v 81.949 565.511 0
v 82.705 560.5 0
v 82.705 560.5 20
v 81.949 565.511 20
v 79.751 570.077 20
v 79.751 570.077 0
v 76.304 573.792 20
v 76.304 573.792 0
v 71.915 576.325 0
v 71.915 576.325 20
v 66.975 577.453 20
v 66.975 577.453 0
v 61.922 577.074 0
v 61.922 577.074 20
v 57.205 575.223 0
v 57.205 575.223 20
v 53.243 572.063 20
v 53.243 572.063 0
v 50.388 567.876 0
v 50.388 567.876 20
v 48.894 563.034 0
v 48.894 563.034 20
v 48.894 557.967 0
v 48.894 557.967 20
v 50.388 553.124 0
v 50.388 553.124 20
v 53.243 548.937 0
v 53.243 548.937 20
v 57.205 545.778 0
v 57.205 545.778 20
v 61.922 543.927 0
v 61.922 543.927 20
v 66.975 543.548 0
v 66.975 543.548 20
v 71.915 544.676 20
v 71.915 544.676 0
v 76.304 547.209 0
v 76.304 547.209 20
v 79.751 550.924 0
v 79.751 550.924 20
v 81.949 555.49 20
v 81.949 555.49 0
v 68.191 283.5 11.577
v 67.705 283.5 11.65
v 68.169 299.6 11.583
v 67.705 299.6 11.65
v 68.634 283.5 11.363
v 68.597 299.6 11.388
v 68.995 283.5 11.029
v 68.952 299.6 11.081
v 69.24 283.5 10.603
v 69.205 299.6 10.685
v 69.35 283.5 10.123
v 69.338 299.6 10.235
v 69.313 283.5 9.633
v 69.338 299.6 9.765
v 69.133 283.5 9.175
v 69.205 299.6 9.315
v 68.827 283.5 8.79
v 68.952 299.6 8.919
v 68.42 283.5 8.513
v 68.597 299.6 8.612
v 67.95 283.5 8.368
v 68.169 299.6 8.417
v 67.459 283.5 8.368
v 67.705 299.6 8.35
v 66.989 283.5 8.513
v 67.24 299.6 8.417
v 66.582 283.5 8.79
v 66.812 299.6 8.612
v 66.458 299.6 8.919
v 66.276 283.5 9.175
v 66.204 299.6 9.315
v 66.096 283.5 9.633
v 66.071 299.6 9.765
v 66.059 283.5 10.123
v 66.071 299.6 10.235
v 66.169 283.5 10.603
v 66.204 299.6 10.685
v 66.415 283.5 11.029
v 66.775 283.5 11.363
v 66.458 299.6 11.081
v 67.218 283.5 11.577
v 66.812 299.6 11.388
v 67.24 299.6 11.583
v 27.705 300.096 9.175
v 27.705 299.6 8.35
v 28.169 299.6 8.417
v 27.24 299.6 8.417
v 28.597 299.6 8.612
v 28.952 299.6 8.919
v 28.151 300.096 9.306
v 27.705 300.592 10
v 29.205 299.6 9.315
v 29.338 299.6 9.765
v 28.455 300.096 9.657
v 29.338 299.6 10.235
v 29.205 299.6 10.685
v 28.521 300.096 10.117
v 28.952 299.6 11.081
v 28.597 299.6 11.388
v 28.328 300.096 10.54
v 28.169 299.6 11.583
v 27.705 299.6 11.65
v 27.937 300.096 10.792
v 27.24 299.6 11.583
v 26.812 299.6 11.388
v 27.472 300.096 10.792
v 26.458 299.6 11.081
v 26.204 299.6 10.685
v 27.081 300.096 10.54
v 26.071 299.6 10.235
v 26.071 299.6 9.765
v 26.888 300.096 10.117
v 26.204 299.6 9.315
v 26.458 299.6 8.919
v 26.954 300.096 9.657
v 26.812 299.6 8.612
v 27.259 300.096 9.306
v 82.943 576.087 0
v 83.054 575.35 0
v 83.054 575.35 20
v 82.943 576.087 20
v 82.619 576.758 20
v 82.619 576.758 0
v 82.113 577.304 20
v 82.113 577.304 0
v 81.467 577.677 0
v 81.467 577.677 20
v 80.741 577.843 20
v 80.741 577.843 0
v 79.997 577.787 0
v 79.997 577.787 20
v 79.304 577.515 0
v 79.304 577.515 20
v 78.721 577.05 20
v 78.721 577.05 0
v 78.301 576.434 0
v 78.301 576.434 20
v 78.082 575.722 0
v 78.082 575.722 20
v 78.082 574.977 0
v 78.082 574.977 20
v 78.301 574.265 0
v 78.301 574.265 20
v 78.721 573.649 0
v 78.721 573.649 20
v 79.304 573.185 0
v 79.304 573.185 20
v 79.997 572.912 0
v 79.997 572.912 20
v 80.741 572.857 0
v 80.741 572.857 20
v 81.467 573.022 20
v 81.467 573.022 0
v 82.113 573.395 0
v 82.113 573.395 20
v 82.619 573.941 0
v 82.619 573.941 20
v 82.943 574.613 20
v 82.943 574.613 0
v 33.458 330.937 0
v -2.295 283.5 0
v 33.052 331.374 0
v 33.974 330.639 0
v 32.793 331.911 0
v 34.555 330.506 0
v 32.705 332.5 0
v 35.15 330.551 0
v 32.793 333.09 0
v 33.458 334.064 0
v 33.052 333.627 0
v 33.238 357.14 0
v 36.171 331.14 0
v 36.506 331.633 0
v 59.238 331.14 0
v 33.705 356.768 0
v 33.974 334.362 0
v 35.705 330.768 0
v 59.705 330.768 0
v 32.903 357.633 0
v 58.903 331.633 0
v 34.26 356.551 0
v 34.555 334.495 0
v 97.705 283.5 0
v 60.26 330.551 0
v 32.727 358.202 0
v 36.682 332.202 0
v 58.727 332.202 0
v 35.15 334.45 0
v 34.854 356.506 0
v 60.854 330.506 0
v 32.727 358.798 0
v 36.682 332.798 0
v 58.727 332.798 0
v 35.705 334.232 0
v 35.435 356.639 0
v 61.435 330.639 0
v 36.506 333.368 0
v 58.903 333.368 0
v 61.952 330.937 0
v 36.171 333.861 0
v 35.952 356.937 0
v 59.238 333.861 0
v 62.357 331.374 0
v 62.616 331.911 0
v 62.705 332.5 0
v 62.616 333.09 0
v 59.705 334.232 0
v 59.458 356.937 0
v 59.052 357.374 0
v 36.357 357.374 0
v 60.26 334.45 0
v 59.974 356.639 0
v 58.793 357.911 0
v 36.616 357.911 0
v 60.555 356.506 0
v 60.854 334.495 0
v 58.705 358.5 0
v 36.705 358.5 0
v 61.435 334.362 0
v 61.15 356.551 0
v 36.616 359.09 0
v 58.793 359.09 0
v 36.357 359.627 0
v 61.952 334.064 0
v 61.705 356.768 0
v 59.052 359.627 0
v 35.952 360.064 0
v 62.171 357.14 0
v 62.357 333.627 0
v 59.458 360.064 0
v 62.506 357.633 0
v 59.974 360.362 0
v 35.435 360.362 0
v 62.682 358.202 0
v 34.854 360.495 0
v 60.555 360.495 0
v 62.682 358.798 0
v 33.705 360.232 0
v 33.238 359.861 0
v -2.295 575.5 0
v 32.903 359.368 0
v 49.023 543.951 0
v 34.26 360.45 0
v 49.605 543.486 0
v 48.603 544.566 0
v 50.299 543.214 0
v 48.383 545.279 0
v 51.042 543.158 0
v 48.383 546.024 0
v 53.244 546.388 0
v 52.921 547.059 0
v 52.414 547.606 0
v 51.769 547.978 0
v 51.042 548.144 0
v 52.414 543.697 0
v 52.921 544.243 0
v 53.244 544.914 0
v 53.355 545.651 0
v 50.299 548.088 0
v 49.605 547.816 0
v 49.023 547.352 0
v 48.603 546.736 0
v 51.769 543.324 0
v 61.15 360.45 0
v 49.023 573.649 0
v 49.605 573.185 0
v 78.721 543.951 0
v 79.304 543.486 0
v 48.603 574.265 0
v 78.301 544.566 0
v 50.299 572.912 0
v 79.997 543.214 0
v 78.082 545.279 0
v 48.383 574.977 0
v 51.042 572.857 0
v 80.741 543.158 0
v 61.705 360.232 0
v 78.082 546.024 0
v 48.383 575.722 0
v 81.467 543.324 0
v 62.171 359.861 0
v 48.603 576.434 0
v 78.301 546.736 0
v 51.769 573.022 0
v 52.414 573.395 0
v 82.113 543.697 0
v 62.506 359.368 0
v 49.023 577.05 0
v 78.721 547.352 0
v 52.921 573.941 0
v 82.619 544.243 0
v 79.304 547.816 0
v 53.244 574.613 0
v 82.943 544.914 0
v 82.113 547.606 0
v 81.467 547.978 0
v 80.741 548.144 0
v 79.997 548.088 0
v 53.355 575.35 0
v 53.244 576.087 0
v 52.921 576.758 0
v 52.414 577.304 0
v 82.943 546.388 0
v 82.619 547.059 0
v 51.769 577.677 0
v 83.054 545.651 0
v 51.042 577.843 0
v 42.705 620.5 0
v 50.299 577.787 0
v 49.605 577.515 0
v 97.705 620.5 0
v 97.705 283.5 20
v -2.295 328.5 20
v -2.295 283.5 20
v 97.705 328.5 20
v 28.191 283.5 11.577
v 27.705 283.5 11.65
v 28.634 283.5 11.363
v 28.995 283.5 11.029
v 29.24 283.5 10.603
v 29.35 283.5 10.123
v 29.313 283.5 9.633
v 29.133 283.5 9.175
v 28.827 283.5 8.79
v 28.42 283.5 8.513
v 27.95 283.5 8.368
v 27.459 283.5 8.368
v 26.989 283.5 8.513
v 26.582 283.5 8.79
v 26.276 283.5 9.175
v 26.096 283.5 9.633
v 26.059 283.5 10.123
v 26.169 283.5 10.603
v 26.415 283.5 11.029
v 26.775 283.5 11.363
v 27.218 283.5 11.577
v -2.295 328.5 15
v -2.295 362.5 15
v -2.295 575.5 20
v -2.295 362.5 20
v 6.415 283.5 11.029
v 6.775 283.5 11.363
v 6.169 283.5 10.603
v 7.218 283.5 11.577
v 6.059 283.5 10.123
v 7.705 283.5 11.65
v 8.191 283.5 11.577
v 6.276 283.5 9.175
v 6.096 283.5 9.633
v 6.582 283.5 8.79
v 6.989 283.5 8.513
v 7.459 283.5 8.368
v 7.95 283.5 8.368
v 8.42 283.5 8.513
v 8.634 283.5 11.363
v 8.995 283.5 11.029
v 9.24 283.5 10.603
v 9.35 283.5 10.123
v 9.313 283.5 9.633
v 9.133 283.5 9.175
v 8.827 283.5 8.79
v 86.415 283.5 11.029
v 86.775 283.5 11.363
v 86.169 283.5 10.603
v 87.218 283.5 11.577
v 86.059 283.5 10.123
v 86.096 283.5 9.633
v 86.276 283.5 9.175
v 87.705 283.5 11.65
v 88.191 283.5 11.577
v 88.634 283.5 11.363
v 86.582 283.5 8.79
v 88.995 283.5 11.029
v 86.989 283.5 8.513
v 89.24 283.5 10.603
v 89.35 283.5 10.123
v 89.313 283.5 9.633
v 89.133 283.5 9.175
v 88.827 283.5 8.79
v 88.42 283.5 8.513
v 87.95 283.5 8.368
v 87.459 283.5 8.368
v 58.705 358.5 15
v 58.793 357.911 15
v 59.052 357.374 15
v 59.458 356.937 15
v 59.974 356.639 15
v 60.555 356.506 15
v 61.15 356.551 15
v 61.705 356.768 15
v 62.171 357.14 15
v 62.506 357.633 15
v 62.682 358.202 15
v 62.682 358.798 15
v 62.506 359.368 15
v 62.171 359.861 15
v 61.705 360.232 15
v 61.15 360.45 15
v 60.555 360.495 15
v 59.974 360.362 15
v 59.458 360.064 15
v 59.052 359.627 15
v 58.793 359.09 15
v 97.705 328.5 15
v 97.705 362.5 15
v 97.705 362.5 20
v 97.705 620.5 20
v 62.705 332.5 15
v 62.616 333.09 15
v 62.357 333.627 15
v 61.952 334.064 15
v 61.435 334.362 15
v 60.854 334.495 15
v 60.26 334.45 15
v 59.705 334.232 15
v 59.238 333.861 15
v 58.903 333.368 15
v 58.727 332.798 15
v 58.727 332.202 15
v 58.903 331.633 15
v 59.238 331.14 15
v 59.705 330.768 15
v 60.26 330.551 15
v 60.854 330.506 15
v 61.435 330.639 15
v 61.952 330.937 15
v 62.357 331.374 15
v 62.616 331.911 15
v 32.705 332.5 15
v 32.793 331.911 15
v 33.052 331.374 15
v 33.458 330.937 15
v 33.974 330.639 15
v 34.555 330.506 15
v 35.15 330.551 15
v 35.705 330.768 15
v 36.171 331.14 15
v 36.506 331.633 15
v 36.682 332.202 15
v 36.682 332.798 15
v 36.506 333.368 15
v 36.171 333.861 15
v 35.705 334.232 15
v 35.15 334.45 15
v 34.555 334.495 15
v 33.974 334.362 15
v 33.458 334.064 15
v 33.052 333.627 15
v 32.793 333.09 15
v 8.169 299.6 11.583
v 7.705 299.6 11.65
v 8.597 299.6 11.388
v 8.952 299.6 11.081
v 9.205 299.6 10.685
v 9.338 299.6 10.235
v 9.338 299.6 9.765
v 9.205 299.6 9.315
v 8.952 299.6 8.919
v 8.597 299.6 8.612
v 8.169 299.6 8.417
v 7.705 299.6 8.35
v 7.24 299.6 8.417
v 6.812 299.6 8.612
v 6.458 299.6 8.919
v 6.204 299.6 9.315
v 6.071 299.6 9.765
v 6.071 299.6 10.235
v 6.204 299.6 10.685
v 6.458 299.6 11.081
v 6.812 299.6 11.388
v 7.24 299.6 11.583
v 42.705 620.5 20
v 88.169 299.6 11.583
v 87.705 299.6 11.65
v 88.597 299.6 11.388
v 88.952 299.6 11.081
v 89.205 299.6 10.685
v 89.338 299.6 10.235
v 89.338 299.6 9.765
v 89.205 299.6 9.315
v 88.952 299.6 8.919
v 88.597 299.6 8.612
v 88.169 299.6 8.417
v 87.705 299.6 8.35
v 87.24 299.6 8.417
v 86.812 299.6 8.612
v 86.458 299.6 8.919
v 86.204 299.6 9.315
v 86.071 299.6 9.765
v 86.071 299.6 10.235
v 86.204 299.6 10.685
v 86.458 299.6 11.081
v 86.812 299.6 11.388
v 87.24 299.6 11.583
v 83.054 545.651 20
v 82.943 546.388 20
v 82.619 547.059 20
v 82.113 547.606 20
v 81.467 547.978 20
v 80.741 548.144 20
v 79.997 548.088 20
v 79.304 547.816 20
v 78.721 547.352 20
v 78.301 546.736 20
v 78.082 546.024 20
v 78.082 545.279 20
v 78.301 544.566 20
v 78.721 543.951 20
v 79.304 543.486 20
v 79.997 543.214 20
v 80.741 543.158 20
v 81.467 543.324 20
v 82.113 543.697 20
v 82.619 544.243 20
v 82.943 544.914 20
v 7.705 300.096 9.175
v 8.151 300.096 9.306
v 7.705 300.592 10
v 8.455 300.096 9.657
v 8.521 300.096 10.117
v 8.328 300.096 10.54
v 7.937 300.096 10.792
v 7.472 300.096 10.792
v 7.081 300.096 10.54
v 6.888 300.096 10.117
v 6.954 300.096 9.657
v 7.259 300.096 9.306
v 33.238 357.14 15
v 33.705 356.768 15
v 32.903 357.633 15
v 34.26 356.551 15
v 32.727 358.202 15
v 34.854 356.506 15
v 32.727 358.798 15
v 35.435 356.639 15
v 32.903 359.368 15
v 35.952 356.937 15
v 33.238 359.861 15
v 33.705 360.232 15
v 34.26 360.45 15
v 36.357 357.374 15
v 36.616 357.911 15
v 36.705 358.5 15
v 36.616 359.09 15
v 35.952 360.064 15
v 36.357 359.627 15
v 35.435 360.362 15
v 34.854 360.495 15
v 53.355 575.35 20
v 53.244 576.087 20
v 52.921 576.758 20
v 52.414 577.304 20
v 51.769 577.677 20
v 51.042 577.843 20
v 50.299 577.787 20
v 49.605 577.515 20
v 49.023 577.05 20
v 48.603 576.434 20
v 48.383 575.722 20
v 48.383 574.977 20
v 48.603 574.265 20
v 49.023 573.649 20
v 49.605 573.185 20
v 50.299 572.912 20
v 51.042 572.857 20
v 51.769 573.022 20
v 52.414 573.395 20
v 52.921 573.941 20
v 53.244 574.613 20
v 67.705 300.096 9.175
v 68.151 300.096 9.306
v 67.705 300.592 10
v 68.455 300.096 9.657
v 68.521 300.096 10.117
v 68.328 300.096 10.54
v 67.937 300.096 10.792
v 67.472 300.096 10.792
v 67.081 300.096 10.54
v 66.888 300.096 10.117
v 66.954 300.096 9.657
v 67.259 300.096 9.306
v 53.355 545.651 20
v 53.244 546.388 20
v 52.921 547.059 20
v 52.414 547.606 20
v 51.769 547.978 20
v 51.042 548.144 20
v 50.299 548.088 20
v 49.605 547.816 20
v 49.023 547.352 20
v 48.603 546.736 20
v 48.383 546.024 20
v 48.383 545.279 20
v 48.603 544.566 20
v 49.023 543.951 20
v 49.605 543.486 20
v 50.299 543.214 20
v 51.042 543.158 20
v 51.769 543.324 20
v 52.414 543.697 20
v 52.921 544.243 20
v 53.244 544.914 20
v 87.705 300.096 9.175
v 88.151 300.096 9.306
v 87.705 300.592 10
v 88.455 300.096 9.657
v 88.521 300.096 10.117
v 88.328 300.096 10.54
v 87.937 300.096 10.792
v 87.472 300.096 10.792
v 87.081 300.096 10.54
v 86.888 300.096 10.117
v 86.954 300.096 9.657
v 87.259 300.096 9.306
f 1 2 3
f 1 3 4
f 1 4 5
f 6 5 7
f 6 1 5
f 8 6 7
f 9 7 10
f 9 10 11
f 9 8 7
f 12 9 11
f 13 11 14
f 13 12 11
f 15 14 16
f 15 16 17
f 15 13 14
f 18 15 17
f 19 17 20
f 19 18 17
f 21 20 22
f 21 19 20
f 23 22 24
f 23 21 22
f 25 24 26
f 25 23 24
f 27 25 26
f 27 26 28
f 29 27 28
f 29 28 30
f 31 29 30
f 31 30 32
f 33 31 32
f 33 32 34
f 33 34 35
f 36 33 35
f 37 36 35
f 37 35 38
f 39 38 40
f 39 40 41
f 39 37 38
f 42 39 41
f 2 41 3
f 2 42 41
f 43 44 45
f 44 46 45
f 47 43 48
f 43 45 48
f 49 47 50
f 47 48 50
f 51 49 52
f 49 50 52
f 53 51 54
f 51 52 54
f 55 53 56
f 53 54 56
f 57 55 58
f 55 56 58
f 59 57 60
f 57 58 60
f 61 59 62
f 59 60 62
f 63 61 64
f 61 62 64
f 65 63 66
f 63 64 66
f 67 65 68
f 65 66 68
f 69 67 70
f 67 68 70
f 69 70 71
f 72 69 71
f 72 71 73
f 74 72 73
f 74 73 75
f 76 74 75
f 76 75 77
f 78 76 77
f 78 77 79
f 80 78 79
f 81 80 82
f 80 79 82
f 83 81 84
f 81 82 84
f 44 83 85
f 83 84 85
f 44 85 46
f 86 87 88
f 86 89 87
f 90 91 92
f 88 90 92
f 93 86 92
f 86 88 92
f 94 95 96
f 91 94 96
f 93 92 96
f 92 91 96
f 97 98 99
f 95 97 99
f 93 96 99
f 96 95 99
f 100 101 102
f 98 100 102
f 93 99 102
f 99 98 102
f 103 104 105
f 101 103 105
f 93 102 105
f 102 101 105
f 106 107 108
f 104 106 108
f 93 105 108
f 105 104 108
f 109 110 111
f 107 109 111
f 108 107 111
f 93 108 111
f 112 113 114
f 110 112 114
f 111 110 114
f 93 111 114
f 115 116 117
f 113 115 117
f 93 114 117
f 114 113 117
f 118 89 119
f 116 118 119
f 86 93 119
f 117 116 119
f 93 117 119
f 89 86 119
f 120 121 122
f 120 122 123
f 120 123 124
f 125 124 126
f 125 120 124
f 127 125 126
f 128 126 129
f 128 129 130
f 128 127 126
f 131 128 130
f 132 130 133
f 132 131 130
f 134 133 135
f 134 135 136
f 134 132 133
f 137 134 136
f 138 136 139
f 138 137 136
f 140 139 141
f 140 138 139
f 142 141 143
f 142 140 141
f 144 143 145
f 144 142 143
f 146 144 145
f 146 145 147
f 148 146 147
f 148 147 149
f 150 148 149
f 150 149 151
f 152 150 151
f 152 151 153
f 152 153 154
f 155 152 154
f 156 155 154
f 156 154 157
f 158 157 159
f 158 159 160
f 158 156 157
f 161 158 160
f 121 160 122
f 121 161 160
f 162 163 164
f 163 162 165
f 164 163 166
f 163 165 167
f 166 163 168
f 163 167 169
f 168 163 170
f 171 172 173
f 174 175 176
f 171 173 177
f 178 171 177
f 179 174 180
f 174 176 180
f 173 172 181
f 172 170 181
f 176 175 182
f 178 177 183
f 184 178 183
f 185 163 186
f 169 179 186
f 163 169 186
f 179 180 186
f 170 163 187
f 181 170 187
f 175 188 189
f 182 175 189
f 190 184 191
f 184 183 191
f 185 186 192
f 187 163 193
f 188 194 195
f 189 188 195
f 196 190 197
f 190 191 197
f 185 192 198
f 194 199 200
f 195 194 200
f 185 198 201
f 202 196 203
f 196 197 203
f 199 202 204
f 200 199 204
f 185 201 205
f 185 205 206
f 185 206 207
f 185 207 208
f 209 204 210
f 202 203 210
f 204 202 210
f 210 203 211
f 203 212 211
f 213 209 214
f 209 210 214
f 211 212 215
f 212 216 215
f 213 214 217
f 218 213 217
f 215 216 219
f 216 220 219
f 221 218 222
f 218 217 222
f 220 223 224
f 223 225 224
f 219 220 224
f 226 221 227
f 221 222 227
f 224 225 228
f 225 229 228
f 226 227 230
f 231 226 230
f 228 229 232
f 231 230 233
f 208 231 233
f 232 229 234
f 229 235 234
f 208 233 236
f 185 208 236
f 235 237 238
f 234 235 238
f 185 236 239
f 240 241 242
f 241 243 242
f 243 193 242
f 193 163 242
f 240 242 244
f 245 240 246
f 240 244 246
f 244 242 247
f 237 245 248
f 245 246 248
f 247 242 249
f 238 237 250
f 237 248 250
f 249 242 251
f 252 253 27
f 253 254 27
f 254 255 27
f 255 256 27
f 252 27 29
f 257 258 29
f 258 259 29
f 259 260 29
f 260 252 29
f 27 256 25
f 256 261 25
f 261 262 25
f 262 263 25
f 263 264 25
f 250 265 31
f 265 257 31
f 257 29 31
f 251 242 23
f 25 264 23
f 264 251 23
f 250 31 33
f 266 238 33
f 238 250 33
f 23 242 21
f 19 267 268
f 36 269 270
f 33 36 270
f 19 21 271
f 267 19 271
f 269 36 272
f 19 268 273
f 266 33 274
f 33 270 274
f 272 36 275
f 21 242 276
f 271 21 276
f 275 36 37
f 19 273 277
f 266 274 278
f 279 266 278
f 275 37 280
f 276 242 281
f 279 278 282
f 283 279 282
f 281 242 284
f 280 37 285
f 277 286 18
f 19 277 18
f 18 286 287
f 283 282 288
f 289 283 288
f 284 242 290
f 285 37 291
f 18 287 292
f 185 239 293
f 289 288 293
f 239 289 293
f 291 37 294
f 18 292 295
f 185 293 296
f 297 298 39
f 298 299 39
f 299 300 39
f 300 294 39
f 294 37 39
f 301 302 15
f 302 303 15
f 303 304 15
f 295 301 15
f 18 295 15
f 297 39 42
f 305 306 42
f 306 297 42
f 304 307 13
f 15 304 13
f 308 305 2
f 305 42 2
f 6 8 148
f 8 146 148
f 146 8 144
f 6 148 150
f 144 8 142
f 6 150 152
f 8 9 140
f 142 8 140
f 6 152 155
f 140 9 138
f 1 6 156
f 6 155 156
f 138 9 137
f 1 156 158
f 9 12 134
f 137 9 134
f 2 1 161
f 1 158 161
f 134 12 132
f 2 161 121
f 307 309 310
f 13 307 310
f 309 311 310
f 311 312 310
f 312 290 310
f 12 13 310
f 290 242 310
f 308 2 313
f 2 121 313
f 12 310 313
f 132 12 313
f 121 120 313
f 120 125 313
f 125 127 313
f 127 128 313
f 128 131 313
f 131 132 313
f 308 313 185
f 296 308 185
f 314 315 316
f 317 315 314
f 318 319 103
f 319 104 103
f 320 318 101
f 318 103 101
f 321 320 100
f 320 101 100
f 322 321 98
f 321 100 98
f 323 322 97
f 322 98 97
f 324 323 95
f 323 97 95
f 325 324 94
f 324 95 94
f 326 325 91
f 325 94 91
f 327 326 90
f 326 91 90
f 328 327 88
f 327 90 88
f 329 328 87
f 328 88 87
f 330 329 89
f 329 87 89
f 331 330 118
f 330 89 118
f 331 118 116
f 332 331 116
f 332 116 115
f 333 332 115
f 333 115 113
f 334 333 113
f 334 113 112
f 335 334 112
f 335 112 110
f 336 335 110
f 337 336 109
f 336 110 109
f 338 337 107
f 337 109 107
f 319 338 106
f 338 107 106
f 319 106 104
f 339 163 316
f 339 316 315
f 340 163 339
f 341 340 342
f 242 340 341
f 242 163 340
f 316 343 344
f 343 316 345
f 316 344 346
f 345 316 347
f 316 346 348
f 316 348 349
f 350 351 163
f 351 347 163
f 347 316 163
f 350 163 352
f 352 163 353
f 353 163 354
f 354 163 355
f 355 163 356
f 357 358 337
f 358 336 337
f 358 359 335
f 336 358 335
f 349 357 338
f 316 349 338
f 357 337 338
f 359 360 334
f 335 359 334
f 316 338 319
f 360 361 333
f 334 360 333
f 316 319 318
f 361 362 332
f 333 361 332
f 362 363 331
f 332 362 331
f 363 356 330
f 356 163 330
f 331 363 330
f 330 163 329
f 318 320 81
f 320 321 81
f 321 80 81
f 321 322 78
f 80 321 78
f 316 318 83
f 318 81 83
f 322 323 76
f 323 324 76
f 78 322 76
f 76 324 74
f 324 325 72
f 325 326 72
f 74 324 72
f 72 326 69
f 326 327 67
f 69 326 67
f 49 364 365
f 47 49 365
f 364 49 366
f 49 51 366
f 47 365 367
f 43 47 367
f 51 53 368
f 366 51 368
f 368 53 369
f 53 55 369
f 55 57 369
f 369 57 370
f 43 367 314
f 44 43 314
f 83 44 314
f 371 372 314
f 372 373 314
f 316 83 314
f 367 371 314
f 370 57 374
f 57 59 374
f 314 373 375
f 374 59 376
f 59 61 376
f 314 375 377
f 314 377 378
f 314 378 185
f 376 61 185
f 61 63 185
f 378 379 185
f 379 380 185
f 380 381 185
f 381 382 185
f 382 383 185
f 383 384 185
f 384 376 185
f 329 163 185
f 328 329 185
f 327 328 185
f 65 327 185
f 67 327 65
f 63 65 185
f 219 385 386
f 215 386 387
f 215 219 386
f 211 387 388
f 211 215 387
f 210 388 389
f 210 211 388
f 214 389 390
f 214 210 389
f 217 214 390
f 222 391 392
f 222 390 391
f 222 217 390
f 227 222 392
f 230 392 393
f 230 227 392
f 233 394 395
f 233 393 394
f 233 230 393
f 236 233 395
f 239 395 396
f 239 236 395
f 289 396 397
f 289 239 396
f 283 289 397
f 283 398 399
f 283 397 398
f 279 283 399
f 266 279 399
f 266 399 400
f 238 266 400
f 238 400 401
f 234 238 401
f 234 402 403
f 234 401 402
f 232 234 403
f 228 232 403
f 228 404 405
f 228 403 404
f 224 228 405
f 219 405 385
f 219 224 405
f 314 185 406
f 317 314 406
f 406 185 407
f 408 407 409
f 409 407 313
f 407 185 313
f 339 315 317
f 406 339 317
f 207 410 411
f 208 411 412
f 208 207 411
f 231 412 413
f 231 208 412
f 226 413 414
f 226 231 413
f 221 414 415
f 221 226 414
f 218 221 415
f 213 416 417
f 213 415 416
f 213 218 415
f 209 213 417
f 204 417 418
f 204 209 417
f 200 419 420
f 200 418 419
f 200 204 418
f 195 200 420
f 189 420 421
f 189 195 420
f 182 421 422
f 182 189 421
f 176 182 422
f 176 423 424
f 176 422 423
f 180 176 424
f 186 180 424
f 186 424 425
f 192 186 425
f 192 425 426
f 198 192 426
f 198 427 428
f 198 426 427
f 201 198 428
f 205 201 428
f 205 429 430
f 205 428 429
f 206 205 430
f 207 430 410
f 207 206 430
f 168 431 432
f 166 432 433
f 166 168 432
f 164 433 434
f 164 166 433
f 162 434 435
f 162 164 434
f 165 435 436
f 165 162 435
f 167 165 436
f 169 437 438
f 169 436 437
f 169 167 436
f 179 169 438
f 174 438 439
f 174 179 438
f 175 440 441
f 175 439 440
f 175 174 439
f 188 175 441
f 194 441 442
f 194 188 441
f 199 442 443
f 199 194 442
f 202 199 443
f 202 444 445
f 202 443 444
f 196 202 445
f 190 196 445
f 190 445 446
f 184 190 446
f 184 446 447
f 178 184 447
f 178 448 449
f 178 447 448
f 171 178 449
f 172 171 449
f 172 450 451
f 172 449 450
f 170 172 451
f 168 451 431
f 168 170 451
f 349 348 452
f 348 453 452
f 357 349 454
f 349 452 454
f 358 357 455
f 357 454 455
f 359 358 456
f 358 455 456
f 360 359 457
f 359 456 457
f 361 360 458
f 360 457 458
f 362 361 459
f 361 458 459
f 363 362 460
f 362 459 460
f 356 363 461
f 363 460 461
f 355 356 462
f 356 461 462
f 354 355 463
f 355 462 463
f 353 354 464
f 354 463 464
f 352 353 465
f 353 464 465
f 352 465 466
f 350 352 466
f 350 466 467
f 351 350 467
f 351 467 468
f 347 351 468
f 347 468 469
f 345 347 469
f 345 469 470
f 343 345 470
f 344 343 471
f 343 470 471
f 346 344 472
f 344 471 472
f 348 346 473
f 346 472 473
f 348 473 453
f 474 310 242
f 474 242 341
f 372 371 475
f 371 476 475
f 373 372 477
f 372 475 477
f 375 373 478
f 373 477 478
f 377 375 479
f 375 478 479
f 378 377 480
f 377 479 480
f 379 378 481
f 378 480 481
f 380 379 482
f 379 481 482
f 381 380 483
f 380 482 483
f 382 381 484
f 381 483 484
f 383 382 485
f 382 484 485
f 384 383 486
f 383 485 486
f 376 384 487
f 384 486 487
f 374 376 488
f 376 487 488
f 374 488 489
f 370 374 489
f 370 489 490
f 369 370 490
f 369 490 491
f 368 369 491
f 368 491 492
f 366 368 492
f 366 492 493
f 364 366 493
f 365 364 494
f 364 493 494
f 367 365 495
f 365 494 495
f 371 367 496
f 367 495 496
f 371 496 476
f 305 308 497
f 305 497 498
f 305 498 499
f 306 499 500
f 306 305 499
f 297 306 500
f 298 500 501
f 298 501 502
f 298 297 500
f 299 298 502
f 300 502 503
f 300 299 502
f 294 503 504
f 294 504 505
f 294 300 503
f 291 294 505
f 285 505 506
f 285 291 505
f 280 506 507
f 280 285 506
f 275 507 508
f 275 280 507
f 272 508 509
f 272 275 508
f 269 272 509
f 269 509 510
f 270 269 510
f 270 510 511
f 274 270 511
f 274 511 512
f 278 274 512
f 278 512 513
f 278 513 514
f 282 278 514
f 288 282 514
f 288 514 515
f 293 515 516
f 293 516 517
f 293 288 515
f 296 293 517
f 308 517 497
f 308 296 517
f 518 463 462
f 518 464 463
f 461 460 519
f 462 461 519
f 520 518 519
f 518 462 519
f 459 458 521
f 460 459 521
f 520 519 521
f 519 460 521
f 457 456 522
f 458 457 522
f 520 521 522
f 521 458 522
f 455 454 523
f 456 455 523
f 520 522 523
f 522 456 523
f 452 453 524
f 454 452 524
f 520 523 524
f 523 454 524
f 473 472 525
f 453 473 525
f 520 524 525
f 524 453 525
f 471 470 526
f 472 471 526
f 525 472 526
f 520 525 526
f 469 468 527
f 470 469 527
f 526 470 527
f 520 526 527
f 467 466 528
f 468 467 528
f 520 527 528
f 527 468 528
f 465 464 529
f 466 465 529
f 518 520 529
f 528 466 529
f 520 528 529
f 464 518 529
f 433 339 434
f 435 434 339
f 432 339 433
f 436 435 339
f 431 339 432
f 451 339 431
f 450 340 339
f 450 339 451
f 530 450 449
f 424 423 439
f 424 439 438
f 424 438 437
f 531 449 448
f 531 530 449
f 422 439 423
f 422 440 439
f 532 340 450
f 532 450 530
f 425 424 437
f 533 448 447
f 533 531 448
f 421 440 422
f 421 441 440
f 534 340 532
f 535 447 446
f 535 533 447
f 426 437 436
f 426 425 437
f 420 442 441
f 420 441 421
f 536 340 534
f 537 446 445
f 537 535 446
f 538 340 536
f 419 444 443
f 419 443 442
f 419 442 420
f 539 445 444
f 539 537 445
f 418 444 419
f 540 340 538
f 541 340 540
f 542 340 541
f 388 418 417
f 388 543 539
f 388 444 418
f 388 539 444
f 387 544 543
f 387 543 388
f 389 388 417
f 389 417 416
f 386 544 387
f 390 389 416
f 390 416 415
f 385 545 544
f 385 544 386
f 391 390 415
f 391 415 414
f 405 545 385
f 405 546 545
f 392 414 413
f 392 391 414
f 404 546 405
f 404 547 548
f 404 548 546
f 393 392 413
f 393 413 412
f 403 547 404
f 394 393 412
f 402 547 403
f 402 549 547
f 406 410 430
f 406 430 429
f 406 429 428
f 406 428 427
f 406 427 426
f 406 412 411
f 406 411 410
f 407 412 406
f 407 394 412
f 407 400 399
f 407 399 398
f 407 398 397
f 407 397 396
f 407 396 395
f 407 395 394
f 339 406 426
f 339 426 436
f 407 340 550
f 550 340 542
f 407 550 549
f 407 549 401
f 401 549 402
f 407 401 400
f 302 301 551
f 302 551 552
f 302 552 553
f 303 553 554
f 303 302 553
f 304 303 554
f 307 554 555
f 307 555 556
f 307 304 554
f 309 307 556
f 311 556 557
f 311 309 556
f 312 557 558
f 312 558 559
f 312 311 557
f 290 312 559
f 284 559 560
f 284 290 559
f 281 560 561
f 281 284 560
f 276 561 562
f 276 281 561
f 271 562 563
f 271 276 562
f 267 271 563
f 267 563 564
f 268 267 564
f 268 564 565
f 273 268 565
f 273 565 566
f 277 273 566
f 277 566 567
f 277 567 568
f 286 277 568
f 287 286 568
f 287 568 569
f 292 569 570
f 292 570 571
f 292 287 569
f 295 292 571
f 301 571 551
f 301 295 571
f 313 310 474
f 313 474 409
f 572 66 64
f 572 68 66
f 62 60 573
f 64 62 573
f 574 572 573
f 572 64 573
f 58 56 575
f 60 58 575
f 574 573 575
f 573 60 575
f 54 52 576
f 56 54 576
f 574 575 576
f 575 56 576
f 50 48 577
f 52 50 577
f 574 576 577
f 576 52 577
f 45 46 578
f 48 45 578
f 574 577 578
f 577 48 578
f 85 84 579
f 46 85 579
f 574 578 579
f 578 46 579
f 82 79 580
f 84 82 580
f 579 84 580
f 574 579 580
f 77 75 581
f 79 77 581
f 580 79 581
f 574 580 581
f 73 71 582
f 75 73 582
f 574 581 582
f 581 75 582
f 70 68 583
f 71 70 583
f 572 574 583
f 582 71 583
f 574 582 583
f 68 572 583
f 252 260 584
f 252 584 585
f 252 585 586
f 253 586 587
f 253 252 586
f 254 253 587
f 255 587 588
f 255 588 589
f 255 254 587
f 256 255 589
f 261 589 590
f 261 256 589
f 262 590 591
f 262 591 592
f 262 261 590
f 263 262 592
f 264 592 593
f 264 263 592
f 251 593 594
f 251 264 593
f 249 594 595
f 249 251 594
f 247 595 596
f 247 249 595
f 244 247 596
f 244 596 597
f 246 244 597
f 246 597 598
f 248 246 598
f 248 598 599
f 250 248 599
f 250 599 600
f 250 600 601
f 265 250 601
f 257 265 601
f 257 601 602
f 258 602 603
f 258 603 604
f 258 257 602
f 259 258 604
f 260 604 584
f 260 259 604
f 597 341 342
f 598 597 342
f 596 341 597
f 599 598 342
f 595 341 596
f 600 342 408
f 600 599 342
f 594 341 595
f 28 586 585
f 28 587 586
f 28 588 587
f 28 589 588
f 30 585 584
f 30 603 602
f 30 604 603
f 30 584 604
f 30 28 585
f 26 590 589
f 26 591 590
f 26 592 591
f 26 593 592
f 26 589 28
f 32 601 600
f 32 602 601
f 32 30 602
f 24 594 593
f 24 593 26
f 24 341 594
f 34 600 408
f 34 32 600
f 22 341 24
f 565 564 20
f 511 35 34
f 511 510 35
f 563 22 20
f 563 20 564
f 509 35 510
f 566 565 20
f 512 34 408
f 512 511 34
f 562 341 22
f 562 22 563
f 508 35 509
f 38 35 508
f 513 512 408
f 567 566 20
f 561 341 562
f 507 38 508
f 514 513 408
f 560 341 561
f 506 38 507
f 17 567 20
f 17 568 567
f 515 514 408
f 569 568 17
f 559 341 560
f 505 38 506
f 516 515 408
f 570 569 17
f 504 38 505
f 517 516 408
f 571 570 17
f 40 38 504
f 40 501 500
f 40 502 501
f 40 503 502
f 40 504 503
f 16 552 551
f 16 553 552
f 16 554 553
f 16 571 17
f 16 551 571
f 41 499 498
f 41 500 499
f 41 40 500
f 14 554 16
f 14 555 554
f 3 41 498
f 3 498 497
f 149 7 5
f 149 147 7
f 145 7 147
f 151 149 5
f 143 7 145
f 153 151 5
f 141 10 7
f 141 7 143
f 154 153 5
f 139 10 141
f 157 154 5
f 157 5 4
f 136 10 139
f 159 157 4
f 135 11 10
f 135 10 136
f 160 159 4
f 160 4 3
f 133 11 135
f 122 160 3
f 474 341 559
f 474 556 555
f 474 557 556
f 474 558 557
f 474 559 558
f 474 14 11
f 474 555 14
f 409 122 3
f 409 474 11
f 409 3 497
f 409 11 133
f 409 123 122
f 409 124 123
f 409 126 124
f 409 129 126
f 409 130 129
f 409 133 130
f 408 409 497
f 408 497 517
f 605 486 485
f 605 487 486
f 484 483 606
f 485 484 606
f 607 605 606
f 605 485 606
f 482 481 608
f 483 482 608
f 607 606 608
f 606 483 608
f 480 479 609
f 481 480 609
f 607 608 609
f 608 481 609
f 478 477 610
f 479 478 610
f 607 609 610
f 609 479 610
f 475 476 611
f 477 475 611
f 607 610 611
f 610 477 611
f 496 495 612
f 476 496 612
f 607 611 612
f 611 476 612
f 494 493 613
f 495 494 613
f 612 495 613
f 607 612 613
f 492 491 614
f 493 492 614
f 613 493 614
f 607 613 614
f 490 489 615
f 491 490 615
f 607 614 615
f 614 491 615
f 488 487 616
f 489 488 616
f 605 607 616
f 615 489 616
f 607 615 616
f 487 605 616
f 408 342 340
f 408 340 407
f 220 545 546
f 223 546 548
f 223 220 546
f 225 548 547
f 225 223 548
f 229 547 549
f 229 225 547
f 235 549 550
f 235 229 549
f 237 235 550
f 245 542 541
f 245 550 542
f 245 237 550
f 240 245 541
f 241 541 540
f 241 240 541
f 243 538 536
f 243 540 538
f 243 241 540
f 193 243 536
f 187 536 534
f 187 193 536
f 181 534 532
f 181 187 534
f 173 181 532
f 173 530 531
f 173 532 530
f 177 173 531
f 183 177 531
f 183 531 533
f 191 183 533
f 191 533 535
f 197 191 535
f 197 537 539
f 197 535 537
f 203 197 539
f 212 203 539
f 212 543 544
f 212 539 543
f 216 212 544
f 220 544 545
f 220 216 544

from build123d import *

# Parameters (mm, degrees)
SKETCH1_W             = 100
SKETCH1_H             = 337
SKETCH1_R             = 17
SKETCH1_R_2           = 2.5
SKETCH1_R_3           = 2
BOSS_EXTRUDE1_DEPTH   = 20
CHAMFER1_SIZE         = 45
SKETCH2_W             = 100
SKETCH2_H             = 34
CUT_EXTRUDE1_DEPTH    = 5
M4_TAPPED_HOLE1_D     = 3.3
M4_TAPPED_HOLE1_DEPTH = 16.1
M4_TAPPED_HOLE1_TIP   = 0.991420021


with BuildPart() as part:
    # Sketch1 → Boss-Extrude1 (new body)
    with BuildSketch(Plane.XY):
        with Locations((47.704546062, 452.000370419)):
            Rectangle(SKETCH1_W, SKETCH1_H)
        with Locations((65.704546062, 560.500370419)):
            Circle(SKETCH1_R, mode=Mode.SUBTRACT)
        with Locations((80.553788467, 575.349612824)):
            Circle(SKETCH1_R_2, mode=Mode.SUBTRACT)
        with Locations((80.553788467, 545.651128014)):
            Circle(SKETCH1_R_2, mode=Mode.SUBTRACT)
        with Locations((50.855303657, 545.651128014)):
            Circle(SKETCH1_R_2, mode=Mode.SUBTRACT)
        with Locations((50.855303657, 575.349612824)):
            Circle(SKETCH1_R_2, mode=Mode.SUBTRACT)
        with Locations((34.704546062, 358.500370419)):
            Circle(SKETCH1_R_3, mode=Mode.SUBTRACT)
        with Locations(Location((60.704546062, 358.500370419, 0), (0, 0, 180))):
            Circle(SKETCH1_R_3, mode=Mode.SUBTRACT)
        with Locations((60.704546062, 332.500370419)):
            Circle(SKETCH1_R_3, mode=Mode.SUBTRACT)
        with Locations(Location((34.704546062, 332.500370419, 0), (0, 0, 180))):
            Circle(SKETCH1_R_3, mode=Mode.SUBTRACT)
    extrude(amount=BOSS_EXTRUDE1_DEPTH)

    # Chamfer1
    chamfer1_edges = [part.edges().sort_by_distance(p)[0] for p in [
        (-2.295453938, 620.500370419, 10),
    ]]
    chamfer(chamfer1_edges, length=CHAMFER1_SIZE)

    # Sketch2 → Cut-Extrude1 (cut)
    with BuildSketch(Plane.XY.offset(20)):
        with Locations((47.704546062, 345.500370419)):
            Rectangle(SKETCH2_W, SKETCH2_H)
    extrude(amount=-CUT_EXTRUDE1_DEPTH, mode=Mode.SUBTRACT)

    # M4 Tapped Hole1
    with Locations(Plane(origin=(7.704546062, 283.500370419, 10), x_dir=(0, 0, -1), z_dir=(0, -1, 0))):
        with Locations((0, 0), (0, 20), (0, 60), (0, 80)):
            Hole(M4_TAPPED_HOLE1_D / 2, depth=M4_TAPPED_HOLE1_DEPTH)
            with Locations((0, 0, -(M4_TAPPED_HOLE1_DEPTH + M4_TAPPED_HOLE1_TIP / 2))):  # 118° drill point
                Cone(0, M4_TAPPED_HOLE1_D / 2, M4_TAPPED_HOLE1_TIP, mode=Mode.SUBTRACT)


solid = part.part
